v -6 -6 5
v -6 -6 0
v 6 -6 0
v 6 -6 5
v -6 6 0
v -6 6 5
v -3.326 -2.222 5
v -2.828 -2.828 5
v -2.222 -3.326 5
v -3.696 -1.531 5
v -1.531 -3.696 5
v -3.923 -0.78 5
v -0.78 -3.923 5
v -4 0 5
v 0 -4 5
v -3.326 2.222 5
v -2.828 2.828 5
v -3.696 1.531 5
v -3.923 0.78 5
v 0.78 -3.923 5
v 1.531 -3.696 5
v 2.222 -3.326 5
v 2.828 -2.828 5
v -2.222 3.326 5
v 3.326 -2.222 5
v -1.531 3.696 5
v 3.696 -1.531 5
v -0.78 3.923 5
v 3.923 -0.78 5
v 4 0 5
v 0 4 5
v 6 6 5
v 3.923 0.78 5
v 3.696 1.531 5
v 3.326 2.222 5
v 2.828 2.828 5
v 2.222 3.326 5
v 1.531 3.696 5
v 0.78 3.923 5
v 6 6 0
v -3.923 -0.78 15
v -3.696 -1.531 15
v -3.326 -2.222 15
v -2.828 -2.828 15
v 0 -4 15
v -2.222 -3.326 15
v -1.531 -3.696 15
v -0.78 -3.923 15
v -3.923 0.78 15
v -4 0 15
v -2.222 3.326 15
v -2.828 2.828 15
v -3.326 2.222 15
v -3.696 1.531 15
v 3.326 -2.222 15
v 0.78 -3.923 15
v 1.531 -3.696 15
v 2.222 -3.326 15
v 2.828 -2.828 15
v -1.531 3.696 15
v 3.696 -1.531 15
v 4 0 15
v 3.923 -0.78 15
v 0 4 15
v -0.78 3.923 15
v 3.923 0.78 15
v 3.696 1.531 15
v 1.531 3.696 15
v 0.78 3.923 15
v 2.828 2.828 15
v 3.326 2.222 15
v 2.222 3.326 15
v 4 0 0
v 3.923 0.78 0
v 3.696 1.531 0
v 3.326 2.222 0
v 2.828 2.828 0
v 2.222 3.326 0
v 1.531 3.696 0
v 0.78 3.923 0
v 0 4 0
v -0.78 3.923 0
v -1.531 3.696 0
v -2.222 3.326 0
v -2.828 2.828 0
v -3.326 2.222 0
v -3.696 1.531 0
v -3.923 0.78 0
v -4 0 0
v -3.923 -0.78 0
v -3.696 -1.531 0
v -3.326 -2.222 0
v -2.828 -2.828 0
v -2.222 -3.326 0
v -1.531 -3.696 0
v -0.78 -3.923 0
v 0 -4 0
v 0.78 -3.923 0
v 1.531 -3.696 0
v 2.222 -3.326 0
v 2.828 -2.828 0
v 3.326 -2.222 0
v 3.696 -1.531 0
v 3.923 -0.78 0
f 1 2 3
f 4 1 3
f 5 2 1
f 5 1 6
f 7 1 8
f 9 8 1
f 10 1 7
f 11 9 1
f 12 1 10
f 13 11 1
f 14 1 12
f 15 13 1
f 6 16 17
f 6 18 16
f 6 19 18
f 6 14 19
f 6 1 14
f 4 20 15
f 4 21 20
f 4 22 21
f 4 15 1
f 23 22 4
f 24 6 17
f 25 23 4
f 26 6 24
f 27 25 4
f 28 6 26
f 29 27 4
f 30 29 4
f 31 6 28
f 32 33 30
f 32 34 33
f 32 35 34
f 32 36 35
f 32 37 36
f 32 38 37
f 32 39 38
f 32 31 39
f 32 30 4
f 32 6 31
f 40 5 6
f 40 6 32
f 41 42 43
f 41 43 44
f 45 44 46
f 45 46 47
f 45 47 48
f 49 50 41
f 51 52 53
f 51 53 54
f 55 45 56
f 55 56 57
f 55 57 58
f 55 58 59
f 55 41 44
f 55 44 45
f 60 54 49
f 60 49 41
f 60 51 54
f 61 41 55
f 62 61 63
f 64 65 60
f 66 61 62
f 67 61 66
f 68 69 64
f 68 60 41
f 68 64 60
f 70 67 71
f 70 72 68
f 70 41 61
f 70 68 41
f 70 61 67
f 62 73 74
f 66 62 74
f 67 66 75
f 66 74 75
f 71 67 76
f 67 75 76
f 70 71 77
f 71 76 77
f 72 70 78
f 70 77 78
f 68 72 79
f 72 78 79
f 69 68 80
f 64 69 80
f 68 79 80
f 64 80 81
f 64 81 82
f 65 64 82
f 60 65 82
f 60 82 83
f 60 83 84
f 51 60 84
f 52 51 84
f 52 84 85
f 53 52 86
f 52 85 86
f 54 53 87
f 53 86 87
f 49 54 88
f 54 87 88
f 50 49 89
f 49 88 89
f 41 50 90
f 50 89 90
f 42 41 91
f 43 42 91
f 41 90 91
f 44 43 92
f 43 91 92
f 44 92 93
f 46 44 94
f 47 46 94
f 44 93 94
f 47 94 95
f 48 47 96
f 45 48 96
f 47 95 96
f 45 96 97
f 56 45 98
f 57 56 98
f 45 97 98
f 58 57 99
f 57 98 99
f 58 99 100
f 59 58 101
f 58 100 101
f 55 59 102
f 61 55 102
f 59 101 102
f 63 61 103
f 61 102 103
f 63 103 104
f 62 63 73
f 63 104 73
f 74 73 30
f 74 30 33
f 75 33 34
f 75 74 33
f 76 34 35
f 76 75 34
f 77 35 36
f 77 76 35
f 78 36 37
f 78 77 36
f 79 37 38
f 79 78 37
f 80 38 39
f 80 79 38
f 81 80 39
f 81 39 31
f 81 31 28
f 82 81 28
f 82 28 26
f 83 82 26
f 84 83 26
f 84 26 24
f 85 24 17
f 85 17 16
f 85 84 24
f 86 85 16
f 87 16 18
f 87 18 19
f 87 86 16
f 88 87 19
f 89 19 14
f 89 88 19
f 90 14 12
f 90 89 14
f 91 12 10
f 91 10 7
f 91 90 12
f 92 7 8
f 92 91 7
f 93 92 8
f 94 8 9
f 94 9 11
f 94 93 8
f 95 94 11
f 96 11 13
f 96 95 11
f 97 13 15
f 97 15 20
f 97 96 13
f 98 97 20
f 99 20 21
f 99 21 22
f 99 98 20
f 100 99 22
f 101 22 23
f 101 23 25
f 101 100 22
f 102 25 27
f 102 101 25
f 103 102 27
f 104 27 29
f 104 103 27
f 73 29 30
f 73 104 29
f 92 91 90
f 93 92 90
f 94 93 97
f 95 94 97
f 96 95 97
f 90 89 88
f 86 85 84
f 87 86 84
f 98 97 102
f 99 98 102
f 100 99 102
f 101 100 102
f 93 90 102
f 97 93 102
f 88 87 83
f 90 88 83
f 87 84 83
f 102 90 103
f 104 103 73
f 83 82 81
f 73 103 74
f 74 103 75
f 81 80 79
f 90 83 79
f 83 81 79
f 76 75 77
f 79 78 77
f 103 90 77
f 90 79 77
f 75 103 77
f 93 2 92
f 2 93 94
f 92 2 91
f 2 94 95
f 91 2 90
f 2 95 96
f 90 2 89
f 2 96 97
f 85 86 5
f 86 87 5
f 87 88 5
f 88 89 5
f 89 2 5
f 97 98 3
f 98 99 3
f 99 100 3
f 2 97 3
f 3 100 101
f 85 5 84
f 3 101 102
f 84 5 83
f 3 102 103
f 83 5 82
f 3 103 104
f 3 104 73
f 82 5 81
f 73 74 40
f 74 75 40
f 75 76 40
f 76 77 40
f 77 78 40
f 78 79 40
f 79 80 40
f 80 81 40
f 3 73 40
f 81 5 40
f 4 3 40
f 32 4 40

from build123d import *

# Parameters (mm, degrees)
F0_W     = 12
F0_H     = 12
F0_R     = 4
F1_DEPTH = 5
F2_R     = 4
F3_DEPTH = 15


with BuildPart() as f1:
    # F0 (on Top) → F1 (new body)
    with BuildSketch(Plane.XY):
        Rectangle(F0_W, F0_H)
        Circle(F0_R, mode=Mode.SUBTRACT)
    extrude(amount=F1_DEPTH)


with BuildPart() as f3:
    # F2 (on Top) → F3 (new body)
    with BuildSketch(Plane.XY):
        Circle(F2_R)
    extrude(amount=F3_DEPTH)


solid = Compound([f1.part, f3.part])
